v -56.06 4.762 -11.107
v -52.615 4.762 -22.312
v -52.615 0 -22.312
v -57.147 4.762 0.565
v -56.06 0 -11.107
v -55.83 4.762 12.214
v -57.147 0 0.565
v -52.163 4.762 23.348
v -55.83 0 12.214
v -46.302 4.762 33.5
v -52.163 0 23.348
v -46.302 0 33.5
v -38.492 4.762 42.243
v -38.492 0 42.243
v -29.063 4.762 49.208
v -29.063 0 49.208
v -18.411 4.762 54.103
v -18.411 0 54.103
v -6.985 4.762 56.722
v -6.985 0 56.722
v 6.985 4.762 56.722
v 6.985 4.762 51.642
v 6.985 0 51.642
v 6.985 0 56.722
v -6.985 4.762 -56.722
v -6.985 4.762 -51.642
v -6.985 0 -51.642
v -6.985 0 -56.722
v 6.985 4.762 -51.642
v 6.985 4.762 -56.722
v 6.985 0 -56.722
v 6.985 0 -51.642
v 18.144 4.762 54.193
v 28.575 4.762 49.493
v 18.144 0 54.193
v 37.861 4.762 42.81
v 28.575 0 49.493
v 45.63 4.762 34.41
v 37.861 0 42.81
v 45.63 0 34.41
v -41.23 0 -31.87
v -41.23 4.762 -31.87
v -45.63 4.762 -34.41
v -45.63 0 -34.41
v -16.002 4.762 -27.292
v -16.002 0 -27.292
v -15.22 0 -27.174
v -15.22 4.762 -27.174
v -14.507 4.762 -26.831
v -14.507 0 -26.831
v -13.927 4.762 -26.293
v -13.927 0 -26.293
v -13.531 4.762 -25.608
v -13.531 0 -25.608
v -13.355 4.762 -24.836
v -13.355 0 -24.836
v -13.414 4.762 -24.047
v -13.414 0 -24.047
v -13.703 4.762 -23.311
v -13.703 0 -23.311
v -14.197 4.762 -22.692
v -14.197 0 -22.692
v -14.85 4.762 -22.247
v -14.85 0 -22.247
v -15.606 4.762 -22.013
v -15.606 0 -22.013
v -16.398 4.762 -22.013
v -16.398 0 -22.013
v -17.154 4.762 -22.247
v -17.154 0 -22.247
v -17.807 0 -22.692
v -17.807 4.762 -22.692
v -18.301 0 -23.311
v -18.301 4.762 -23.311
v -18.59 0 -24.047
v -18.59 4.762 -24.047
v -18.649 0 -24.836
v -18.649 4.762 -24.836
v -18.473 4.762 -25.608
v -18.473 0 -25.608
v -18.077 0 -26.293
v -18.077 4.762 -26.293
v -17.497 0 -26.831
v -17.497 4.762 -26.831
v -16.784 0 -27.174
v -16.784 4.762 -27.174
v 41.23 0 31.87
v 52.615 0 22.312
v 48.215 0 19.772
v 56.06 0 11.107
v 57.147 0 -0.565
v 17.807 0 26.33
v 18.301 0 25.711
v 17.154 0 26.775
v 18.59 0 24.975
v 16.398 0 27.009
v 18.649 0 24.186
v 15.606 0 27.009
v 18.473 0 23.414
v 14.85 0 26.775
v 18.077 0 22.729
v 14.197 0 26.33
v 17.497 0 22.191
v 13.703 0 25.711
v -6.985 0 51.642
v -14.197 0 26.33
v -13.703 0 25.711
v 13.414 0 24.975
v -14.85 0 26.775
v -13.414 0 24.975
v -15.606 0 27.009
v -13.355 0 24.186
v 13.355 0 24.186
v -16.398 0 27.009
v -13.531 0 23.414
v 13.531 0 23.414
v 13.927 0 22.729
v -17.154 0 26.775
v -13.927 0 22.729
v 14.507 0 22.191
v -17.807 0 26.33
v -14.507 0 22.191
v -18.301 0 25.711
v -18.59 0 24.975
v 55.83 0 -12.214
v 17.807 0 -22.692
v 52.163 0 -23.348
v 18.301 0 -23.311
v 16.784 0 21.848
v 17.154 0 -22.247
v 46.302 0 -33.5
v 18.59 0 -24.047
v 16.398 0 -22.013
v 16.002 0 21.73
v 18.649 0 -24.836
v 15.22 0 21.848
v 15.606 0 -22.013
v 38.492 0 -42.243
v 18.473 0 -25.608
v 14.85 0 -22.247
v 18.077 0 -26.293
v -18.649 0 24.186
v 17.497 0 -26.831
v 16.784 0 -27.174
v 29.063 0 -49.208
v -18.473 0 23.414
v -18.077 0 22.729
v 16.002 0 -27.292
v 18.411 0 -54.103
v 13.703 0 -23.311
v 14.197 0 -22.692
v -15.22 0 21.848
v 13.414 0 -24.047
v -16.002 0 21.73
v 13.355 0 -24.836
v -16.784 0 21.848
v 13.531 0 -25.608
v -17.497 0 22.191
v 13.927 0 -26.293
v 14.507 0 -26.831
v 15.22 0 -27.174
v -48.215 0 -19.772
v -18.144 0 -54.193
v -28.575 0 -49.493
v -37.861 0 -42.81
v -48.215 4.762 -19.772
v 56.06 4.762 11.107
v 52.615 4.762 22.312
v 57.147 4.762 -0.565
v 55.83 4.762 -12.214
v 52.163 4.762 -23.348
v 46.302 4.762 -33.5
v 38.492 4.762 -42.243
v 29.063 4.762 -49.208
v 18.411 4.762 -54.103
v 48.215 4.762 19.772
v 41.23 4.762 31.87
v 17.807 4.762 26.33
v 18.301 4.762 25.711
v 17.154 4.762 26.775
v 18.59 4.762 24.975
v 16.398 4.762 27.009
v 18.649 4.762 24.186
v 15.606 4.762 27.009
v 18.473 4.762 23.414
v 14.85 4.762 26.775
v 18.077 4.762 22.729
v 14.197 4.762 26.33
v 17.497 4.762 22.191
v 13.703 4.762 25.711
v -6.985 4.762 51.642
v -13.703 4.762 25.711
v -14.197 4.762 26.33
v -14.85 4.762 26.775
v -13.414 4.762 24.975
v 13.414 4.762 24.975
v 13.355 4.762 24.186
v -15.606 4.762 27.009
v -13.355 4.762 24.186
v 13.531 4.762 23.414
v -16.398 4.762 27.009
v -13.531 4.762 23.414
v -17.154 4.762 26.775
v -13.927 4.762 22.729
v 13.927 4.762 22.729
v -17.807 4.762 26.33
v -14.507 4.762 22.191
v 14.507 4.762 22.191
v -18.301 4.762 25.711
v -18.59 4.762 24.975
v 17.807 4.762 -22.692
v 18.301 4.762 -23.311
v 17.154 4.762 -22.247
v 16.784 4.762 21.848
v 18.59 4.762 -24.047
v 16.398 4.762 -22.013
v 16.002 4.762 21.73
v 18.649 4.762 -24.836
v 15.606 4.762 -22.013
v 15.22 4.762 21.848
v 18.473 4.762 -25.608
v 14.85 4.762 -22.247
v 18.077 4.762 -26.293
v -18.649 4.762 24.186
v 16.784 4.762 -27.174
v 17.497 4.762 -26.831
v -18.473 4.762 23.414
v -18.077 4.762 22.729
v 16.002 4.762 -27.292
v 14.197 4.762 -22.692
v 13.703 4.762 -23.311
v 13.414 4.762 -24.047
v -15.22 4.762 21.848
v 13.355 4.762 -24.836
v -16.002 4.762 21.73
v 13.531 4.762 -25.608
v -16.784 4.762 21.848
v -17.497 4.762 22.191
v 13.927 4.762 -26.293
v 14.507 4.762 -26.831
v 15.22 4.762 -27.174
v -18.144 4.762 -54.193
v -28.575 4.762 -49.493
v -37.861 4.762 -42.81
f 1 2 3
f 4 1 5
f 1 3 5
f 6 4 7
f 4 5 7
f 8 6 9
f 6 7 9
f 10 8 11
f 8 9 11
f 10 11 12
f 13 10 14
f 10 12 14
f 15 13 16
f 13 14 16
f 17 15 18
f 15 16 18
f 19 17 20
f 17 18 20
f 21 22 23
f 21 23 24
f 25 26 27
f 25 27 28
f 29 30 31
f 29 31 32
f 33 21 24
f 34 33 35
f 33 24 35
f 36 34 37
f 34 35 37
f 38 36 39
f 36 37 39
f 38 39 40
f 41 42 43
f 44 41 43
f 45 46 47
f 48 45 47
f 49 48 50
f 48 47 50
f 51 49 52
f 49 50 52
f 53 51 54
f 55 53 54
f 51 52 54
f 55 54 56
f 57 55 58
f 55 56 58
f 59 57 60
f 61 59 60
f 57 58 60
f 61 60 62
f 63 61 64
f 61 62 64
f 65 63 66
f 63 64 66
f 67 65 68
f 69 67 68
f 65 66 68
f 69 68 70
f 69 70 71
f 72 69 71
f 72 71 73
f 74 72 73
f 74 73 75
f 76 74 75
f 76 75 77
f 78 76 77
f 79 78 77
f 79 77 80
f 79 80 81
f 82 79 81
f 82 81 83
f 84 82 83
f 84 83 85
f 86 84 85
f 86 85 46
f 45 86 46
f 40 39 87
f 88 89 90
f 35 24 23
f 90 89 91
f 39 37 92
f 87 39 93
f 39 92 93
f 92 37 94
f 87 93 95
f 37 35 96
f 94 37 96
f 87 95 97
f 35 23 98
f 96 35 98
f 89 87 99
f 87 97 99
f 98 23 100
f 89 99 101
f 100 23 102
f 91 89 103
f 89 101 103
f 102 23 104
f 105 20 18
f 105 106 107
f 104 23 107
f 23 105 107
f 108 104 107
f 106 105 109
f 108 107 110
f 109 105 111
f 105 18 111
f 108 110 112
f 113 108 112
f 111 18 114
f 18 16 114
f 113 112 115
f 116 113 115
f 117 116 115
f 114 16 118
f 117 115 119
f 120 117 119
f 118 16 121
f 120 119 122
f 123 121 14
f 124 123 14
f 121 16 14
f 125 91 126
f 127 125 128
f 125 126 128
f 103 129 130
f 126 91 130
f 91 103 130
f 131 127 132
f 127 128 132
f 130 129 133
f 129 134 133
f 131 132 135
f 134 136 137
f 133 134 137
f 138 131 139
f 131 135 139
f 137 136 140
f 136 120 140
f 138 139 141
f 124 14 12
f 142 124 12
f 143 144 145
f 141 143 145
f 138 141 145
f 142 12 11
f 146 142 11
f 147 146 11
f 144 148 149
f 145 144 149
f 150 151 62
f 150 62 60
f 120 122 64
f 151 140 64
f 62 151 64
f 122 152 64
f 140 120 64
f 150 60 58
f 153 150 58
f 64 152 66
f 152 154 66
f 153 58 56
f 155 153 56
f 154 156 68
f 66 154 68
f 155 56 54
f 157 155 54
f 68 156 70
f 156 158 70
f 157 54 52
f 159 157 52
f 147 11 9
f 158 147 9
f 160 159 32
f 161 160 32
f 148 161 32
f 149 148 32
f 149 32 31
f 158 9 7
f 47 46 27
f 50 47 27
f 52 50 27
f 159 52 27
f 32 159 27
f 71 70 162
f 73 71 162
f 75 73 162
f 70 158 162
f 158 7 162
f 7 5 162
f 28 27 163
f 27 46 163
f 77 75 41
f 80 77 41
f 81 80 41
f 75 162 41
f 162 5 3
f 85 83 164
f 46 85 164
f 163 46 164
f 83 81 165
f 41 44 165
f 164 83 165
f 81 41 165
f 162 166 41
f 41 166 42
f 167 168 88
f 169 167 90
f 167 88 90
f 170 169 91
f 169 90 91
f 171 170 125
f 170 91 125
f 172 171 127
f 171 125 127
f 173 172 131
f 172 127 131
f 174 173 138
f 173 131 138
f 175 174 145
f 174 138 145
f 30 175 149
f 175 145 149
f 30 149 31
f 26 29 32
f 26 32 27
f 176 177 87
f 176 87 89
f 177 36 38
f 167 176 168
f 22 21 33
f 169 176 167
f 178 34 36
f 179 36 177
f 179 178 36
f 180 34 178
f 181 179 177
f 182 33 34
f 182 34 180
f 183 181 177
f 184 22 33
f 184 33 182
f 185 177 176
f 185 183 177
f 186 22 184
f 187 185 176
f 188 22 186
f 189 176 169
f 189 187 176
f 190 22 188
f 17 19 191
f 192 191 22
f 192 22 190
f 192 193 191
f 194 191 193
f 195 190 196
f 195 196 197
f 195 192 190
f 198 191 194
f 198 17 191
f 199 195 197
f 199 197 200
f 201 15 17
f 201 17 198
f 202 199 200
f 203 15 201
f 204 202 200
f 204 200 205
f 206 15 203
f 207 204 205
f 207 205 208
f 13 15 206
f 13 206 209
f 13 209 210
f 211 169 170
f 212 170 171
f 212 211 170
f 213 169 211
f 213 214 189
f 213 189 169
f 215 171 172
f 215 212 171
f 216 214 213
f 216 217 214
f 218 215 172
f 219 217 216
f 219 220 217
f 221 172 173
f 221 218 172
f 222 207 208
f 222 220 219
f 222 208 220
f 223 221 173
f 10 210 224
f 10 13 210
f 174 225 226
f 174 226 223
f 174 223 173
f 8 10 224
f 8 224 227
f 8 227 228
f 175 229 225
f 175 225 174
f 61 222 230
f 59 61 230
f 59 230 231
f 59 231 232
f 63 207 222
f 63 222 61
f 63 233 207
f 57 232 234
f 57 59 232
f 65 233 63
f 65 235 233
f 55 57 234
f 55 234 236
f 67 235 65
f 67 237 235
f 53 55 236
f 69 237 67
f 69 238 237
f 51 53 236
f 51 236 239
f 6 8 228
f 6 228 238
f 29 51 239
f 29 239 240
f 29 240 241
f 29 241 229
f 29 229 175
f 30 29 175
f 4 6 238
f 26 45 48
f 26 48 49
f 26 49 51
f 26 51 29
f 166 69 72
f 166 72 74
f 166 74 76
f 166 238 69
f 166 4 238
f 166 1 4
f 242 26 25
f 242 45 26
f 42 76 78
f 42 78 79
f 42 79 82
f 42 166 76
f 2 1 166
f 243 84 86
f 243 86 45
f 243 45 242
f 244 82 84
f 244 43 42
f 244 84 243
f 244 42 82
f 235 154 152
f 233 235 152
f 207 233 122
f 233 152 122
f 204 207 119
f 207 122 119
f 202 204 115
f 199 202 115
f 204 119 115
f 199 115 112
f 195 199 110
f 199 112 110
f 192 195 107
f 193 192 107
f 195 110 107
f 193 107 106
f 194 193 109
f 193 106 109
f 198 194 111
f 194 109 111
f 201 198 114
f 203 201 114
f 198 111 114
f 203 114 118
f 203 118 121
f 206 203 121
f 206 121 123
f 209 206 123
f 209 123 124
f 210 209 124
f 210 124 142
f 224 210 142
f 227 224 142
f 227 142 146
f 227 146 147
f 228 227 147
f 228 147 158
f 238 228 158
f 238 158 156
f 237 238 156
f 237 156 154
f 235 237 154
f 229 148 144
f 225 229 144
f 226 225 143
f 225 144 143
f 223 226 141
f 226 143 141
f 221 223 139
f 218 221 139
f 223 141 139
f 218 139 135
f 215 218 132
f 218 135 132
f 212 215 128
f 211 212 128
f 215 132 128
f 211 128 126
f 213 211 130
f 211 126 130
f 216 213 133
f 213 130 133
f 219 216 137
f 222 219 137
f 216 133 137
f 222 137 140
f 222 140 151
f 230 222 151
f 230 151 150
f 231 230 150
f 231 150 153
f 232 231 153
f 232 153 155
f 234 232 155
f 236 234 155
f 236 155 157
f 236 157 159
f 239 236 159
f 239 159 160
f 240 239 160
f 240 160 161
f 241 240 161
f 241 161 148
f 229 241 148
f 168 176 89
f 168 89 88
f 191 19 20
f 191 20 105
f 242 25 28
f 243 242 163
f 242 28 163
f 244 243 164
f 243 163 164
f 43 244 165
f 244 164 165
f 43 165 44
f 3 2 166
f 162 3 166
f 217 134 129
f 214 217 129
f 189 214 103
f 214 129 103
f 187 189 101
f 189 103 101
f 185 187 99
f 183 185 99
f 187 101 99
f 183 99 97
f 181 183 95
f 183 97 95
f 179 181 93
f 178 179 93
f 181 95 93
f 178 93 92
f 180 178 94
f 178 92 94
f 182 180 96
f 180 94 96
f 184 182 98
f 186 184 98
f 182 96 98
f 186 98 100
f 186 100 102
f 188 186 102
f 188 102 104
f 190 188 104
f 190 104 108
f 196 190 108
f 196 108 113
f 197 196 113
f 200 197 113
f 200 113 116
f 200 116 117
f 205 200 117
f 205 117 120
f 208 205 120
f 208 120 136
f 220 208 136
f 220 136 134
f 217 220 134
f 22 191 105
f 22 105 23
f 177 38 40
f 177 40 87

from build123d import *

# Parameters (mm, degrees)
SKETCH1_R                  = 57.15
BOSS_EXTRUDE1_DEPTH        = 4.7625
CUT_EXTRUDE1_REACH         = 82.963
CUT_EXTRUDE2_REACH         = 82.661
F_4_0_209_DIAMETER_HOLE1_D = 5.3086


with BuildPart() as part:
    # Sketch1 → Boss-Extrude1 (new body)
    with BuildSketch(Plane(origin=(0, 0, 0), x_dir=(1, 0, 0), z_dir=(0, 1, 0))):
        with Locations(Location((0, 0, 0), (0, 0, 90))):
            Circle(SKETCH1_R)
    extrude(amount=BOSS_EXTRUDE1_DEPTH)

    # Sketch2 → Cut-Extrude1 (cut, up to next)
    with BuildSketch(Plane(origin=(0, 4.7625, 0), x_dir=(1, 0, 0), z_dir=(0, 1, 0)), mode=Mode.PRIVATE) as cut_extrude1_sk1:
        with BuildLine():
            Line((-6.985, -51.641532728), (6.985, -51.641532728))
            Line((6.985, -51.641532728), (6.985, -56.721532728))
            ThreePointArc((6.985, -56.721532728), (0, -57.15), (-6.985, -56.721532728))
            Line((-6.985, -56.721532728), (-6.985, -51.641532728))
        make_face()
    cut_extrude1_tool1 = extrude(cut_extrude1_sk1.sketch, amount=-CUT_EXTRUDE1_REACH, mode=Mode.PRIVATE) & part.part
    # Sketch2 → Cut-Extrude1 (cut, up to next)
    with BuildSketch(Plane(origin=(0, 4.7625, 0), x_dir=(1, 0, 0), z_dir=(0, 1, 0)), mode=Mode.PRIVATE) as cut_extrude1_sk2:
        with BuildLine():
            Line((-6.985, 51.641532728), (-6.985, 56.721532728))
            ThreePointArc((-6.985, 56.721532728), (0, 57.15), (6.985, 56.721532728))
            Line((6.985, 56.721532728), (6.985, 51.641532728))
            Line((6.985, 51.641532728), (-6.985, 51.641532728))
        make_face()
    cut_extrude1_tool2 = extrude(cut_extrude1_sk2.sketch, amount=-CUT_EXTRUDE1_REACH, mode=Mode.PRIVATE) & part.part
    add(cut_extrude1_tool1.solids().sort_by_distance((0, 4.7625, 54.325982))[0], mode=Mode.SUBTRACT)
    add(cut_extrude1_tool2.solids().sort_by_distance((0, 4.7625, -54.325982))[0], mode=Mode.SUBTRACT)

    # Sketch3 → Cut-Extrude2 (cut, up to next)
    with BuildSketch(Plane(origin=(0, 4.7625, 0), x_dir=(1, 0, 0), z_dir=(0, 1, 0)), mode=Mode.PRIVATE) as cut_extrude2_sk1:
        with BuildLine():
            Line((41.230379233, -31.869953809), (48.215379233, -19.771578919))
            Line((48.215379233, -19.771578919), (52.614788284, -22.311578919))
            ThreePointArc((52.614788284, -22.311578919), (49.493351826, -28.575), (45.629788284, -34.409953809))
            Line((45.629788284, -34.409953809), (41.230379233, -31.869953809))
        make_face()
    cut_extrude2_tool1 = extrude(cut_extrude2_sk1.sketch, amount=-CUT_EXTRUDE2_REACH, mode=Mode.PRIVATE) & part.part
    # Sketch3 → Cut-Extrude2 (cut, up to next)
    with BuildSketch(Plane(origin=(0, 4.7625, 0), x_dir=(1, 0, 0), z_dir=(0, 1, 0)), mode=Mode.PRIVATE) as cut_extrude2_sk2:
        with BuildLine():
            Line((-41.230379233, 31.869953809), (-45.629788284, 34.409953809))
            ThreePointArc((-45.629788284, 34.409953809), (-49.493351826, 28.575), (-52.614788284, 22.311578919))
            Line((-52.614788284, 22.311578919), (-48.215379233, 19.771578919))
            Line((-48.215379233, 19.771578919), (-41.230379233, 31.869953809))
        make_face()
    cut_extrude2_tool2 = extrude(cut_extrude2_sk2.sketch, amount=-CUT_EXTRUDE2_REACH, mode=Mode.PRIVATE) & part.part
    add(cut_extrude2_tool1.solids().sort_by_distance((47.04768, 4.7625, 27.162991))[0], mode=Mode.SUBTRACT)
    add(cut_extrude2_tool2.solids().sort_by_distance((-47.04768, 4.7625, -27.162991))[0], mode=Mode.SUBTRACT)

    # #4 (0.209) Diameter Hole1 (through all)
    with Locations(Plane(origin=(16.002, 4.7625, -24.638), x_dir=(0, 0, 1), z_dir=(0, 1, 0))):
        with Locations((0, 0), (49.022, 0), (49.022, -32.004), (0, -32.004)):
            Hole(F_4_0_209_DIAMETER_HOLE1_D / 2)


solid = part.part
